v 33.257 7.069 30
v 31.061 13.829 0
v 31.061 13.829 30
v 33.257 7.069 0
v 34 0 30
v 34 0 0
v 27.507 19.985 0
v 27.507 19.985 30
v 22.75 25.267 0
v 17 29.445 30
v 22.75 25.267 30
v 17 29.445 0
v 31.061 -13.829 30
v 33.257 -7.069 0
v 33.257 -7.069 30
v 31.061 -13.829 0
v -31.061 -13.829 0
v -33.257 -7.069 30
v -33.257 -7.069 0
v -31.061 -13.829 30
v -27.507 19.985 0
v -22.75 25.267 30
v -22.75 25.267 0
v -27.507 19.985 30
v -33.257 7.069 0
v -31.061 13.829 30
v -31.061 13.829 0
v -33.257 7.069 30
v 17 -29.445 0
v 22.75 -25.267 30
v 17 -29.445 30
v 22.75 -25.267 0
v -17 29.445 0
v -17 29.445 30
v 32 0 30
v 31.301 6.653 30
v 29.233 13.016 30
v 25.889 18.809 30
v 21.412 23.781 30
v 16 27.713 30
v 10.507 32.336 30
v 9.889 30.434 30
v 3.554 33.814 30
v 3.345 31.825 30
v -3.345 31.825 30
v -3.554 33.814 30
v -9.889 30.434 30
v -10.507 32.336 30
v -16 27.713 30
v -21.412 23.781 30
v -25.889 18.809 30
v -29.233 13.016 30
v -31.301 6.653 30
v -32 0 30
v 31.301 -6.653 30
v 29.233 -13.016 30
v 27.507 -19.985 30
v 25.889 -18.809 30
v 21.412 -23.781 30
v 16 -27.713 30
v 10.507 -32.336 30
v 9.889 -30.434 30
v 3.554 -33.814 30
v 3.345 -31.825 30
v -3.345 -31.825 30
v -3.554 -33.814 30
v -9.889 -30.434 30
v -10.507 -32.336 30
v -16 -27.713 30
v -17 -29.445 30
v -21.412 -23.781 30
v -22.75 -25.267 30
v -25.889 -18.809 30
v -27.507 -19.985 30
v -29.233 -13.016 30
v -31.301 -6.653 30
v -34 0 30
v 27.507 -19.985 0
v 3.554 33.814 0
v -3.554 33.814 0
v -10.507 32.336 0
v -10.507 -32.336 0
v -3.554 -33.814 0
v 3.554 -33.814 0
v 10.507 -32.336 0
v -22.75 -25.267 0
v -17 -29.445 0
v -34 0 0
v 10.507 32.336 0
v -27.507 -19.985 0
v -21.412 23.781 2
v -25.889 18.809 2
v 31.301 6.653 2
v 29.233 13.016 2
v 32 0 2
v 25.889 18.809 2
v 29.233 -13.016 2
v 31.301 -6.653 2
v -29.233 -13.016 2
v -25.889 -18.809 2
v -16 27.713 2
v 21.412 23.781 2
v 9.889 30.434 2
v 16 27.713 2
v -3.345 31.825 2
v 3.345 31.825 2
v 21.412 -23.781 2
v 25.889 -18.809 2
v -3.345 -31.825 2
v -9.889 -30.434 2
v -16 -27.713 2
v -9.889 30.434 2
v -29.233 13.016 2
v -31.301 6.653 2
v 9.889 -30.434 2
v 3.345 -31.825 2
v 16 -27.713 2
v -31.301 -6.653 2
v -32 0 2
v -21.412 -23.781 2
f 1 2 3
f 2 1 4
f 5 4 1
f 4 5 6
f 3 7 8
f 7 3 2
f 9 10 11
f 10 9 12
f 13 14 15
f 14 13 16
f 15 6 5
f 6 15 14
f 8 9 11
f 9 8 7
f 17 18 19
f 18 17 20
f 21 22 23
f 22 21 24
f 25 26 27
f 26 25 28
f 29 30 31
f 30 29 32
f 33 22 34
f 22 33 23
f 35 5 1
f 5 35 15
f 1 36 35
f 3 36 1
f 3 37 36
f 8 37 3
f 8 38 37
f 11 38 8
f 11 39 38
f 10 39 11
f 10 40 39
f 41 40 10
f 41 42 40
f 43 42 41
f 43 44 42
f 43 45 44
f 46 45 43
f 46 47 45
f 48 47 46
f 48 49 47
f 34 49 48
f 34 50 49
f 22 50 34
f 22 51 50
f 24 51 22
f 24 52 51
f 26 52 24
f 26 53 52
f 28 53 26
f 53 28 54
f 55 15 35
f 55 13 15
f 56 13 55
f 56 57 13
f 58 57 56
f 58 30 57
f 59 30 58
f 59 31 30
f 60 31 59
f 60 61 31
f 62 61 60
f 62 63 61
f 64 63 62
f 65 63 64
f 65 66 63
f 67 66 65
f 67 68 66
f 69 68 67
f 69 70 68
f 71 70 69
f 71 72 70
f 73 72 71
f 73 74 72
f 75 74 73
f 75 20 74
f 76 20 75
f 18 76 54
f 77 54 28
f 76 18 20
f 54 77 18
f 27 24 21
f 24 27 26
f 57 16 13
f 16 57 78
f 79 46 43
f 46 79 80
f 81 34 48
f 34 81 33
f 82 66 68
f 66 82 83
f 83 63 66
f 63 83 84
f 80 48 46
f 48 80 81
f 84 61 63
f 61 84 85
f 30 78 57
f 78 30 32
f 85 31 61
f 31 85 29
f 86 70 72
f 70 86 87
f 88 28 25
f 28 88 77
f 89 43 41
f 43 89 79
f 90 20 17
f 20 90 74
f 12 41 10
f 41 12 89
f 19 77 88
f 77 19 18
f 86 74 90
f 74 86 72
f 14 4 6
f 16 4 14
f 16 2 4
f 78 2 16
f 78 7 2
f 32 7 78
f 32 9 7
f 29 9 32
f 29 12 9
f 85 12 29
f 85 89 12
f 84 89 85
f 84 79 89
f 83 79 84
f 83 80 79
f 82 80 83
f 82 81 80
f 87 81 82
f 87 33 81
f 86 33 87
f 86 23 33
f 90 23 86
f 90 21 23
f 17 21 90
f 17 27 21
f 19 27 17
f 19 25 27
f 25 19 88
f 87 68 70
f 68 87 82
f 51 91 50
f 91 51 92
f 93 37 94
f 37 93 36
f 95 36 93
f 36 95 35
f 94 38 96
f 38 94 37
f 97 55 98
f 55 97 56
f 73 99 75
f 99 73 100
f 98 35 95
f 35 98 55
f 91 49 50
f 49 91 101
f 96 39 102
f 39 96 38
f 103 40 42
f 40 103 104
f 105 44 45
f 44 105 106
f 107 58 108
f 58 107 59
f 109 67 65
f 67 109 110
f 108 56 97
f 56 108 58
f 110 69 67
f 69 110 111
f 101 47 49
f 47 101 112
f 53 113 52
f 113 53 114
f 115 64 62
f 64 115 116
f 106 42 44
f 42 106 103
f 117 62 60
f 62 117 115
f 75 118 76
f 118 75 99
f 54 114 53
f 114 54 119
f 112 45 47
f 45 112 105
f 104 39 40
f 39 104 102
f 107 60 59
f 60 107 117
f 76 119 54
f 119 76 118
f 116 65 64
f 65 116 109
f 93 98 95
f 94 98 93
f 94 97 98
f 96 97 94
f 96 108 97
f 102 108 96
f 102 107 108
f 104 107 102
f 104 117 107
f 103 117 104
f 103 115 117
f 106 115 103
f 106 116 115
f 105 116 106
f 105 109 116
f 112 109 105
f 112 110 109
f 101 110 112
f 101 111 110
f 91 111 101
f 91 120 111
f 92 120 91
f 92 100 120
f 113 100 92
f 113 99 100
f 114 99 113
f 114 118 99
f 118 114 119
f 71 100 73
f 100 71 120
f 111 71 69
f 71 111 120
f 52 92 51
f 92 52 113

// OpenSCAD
/*
 * cup(innerRadius, innerHeight, wallWidth)
 *
 * Create a water-tight.
 *
 * Arguments:
 *  - innerRadius - The internal radius of the saucer. Should have
 *      some wiggle room against the pot.
 *  - innerHeight - The internal, usable height of the saucer.
 *  - wallWidth - The width of any wall, including the sides and bottom.
 *
 * Total diameter can be calculated by (innerRadius + wallWidth) * 2
 * Total height can be calculated by innerHeight + wallWidth
 */
module cup(innerRadius, innerHeight, wallWidth) {
	outerRadius = innerRadius + wallWidth;

	union() {
		difference() {
			cylinder(r = outerRadius, h = innerHeight);
			translate([0, 0, wallWidth]) {
				cylinder(r = innerRadius, h = innerHeight);
			}
		}
	}
}

cup(32, 30, 2);
